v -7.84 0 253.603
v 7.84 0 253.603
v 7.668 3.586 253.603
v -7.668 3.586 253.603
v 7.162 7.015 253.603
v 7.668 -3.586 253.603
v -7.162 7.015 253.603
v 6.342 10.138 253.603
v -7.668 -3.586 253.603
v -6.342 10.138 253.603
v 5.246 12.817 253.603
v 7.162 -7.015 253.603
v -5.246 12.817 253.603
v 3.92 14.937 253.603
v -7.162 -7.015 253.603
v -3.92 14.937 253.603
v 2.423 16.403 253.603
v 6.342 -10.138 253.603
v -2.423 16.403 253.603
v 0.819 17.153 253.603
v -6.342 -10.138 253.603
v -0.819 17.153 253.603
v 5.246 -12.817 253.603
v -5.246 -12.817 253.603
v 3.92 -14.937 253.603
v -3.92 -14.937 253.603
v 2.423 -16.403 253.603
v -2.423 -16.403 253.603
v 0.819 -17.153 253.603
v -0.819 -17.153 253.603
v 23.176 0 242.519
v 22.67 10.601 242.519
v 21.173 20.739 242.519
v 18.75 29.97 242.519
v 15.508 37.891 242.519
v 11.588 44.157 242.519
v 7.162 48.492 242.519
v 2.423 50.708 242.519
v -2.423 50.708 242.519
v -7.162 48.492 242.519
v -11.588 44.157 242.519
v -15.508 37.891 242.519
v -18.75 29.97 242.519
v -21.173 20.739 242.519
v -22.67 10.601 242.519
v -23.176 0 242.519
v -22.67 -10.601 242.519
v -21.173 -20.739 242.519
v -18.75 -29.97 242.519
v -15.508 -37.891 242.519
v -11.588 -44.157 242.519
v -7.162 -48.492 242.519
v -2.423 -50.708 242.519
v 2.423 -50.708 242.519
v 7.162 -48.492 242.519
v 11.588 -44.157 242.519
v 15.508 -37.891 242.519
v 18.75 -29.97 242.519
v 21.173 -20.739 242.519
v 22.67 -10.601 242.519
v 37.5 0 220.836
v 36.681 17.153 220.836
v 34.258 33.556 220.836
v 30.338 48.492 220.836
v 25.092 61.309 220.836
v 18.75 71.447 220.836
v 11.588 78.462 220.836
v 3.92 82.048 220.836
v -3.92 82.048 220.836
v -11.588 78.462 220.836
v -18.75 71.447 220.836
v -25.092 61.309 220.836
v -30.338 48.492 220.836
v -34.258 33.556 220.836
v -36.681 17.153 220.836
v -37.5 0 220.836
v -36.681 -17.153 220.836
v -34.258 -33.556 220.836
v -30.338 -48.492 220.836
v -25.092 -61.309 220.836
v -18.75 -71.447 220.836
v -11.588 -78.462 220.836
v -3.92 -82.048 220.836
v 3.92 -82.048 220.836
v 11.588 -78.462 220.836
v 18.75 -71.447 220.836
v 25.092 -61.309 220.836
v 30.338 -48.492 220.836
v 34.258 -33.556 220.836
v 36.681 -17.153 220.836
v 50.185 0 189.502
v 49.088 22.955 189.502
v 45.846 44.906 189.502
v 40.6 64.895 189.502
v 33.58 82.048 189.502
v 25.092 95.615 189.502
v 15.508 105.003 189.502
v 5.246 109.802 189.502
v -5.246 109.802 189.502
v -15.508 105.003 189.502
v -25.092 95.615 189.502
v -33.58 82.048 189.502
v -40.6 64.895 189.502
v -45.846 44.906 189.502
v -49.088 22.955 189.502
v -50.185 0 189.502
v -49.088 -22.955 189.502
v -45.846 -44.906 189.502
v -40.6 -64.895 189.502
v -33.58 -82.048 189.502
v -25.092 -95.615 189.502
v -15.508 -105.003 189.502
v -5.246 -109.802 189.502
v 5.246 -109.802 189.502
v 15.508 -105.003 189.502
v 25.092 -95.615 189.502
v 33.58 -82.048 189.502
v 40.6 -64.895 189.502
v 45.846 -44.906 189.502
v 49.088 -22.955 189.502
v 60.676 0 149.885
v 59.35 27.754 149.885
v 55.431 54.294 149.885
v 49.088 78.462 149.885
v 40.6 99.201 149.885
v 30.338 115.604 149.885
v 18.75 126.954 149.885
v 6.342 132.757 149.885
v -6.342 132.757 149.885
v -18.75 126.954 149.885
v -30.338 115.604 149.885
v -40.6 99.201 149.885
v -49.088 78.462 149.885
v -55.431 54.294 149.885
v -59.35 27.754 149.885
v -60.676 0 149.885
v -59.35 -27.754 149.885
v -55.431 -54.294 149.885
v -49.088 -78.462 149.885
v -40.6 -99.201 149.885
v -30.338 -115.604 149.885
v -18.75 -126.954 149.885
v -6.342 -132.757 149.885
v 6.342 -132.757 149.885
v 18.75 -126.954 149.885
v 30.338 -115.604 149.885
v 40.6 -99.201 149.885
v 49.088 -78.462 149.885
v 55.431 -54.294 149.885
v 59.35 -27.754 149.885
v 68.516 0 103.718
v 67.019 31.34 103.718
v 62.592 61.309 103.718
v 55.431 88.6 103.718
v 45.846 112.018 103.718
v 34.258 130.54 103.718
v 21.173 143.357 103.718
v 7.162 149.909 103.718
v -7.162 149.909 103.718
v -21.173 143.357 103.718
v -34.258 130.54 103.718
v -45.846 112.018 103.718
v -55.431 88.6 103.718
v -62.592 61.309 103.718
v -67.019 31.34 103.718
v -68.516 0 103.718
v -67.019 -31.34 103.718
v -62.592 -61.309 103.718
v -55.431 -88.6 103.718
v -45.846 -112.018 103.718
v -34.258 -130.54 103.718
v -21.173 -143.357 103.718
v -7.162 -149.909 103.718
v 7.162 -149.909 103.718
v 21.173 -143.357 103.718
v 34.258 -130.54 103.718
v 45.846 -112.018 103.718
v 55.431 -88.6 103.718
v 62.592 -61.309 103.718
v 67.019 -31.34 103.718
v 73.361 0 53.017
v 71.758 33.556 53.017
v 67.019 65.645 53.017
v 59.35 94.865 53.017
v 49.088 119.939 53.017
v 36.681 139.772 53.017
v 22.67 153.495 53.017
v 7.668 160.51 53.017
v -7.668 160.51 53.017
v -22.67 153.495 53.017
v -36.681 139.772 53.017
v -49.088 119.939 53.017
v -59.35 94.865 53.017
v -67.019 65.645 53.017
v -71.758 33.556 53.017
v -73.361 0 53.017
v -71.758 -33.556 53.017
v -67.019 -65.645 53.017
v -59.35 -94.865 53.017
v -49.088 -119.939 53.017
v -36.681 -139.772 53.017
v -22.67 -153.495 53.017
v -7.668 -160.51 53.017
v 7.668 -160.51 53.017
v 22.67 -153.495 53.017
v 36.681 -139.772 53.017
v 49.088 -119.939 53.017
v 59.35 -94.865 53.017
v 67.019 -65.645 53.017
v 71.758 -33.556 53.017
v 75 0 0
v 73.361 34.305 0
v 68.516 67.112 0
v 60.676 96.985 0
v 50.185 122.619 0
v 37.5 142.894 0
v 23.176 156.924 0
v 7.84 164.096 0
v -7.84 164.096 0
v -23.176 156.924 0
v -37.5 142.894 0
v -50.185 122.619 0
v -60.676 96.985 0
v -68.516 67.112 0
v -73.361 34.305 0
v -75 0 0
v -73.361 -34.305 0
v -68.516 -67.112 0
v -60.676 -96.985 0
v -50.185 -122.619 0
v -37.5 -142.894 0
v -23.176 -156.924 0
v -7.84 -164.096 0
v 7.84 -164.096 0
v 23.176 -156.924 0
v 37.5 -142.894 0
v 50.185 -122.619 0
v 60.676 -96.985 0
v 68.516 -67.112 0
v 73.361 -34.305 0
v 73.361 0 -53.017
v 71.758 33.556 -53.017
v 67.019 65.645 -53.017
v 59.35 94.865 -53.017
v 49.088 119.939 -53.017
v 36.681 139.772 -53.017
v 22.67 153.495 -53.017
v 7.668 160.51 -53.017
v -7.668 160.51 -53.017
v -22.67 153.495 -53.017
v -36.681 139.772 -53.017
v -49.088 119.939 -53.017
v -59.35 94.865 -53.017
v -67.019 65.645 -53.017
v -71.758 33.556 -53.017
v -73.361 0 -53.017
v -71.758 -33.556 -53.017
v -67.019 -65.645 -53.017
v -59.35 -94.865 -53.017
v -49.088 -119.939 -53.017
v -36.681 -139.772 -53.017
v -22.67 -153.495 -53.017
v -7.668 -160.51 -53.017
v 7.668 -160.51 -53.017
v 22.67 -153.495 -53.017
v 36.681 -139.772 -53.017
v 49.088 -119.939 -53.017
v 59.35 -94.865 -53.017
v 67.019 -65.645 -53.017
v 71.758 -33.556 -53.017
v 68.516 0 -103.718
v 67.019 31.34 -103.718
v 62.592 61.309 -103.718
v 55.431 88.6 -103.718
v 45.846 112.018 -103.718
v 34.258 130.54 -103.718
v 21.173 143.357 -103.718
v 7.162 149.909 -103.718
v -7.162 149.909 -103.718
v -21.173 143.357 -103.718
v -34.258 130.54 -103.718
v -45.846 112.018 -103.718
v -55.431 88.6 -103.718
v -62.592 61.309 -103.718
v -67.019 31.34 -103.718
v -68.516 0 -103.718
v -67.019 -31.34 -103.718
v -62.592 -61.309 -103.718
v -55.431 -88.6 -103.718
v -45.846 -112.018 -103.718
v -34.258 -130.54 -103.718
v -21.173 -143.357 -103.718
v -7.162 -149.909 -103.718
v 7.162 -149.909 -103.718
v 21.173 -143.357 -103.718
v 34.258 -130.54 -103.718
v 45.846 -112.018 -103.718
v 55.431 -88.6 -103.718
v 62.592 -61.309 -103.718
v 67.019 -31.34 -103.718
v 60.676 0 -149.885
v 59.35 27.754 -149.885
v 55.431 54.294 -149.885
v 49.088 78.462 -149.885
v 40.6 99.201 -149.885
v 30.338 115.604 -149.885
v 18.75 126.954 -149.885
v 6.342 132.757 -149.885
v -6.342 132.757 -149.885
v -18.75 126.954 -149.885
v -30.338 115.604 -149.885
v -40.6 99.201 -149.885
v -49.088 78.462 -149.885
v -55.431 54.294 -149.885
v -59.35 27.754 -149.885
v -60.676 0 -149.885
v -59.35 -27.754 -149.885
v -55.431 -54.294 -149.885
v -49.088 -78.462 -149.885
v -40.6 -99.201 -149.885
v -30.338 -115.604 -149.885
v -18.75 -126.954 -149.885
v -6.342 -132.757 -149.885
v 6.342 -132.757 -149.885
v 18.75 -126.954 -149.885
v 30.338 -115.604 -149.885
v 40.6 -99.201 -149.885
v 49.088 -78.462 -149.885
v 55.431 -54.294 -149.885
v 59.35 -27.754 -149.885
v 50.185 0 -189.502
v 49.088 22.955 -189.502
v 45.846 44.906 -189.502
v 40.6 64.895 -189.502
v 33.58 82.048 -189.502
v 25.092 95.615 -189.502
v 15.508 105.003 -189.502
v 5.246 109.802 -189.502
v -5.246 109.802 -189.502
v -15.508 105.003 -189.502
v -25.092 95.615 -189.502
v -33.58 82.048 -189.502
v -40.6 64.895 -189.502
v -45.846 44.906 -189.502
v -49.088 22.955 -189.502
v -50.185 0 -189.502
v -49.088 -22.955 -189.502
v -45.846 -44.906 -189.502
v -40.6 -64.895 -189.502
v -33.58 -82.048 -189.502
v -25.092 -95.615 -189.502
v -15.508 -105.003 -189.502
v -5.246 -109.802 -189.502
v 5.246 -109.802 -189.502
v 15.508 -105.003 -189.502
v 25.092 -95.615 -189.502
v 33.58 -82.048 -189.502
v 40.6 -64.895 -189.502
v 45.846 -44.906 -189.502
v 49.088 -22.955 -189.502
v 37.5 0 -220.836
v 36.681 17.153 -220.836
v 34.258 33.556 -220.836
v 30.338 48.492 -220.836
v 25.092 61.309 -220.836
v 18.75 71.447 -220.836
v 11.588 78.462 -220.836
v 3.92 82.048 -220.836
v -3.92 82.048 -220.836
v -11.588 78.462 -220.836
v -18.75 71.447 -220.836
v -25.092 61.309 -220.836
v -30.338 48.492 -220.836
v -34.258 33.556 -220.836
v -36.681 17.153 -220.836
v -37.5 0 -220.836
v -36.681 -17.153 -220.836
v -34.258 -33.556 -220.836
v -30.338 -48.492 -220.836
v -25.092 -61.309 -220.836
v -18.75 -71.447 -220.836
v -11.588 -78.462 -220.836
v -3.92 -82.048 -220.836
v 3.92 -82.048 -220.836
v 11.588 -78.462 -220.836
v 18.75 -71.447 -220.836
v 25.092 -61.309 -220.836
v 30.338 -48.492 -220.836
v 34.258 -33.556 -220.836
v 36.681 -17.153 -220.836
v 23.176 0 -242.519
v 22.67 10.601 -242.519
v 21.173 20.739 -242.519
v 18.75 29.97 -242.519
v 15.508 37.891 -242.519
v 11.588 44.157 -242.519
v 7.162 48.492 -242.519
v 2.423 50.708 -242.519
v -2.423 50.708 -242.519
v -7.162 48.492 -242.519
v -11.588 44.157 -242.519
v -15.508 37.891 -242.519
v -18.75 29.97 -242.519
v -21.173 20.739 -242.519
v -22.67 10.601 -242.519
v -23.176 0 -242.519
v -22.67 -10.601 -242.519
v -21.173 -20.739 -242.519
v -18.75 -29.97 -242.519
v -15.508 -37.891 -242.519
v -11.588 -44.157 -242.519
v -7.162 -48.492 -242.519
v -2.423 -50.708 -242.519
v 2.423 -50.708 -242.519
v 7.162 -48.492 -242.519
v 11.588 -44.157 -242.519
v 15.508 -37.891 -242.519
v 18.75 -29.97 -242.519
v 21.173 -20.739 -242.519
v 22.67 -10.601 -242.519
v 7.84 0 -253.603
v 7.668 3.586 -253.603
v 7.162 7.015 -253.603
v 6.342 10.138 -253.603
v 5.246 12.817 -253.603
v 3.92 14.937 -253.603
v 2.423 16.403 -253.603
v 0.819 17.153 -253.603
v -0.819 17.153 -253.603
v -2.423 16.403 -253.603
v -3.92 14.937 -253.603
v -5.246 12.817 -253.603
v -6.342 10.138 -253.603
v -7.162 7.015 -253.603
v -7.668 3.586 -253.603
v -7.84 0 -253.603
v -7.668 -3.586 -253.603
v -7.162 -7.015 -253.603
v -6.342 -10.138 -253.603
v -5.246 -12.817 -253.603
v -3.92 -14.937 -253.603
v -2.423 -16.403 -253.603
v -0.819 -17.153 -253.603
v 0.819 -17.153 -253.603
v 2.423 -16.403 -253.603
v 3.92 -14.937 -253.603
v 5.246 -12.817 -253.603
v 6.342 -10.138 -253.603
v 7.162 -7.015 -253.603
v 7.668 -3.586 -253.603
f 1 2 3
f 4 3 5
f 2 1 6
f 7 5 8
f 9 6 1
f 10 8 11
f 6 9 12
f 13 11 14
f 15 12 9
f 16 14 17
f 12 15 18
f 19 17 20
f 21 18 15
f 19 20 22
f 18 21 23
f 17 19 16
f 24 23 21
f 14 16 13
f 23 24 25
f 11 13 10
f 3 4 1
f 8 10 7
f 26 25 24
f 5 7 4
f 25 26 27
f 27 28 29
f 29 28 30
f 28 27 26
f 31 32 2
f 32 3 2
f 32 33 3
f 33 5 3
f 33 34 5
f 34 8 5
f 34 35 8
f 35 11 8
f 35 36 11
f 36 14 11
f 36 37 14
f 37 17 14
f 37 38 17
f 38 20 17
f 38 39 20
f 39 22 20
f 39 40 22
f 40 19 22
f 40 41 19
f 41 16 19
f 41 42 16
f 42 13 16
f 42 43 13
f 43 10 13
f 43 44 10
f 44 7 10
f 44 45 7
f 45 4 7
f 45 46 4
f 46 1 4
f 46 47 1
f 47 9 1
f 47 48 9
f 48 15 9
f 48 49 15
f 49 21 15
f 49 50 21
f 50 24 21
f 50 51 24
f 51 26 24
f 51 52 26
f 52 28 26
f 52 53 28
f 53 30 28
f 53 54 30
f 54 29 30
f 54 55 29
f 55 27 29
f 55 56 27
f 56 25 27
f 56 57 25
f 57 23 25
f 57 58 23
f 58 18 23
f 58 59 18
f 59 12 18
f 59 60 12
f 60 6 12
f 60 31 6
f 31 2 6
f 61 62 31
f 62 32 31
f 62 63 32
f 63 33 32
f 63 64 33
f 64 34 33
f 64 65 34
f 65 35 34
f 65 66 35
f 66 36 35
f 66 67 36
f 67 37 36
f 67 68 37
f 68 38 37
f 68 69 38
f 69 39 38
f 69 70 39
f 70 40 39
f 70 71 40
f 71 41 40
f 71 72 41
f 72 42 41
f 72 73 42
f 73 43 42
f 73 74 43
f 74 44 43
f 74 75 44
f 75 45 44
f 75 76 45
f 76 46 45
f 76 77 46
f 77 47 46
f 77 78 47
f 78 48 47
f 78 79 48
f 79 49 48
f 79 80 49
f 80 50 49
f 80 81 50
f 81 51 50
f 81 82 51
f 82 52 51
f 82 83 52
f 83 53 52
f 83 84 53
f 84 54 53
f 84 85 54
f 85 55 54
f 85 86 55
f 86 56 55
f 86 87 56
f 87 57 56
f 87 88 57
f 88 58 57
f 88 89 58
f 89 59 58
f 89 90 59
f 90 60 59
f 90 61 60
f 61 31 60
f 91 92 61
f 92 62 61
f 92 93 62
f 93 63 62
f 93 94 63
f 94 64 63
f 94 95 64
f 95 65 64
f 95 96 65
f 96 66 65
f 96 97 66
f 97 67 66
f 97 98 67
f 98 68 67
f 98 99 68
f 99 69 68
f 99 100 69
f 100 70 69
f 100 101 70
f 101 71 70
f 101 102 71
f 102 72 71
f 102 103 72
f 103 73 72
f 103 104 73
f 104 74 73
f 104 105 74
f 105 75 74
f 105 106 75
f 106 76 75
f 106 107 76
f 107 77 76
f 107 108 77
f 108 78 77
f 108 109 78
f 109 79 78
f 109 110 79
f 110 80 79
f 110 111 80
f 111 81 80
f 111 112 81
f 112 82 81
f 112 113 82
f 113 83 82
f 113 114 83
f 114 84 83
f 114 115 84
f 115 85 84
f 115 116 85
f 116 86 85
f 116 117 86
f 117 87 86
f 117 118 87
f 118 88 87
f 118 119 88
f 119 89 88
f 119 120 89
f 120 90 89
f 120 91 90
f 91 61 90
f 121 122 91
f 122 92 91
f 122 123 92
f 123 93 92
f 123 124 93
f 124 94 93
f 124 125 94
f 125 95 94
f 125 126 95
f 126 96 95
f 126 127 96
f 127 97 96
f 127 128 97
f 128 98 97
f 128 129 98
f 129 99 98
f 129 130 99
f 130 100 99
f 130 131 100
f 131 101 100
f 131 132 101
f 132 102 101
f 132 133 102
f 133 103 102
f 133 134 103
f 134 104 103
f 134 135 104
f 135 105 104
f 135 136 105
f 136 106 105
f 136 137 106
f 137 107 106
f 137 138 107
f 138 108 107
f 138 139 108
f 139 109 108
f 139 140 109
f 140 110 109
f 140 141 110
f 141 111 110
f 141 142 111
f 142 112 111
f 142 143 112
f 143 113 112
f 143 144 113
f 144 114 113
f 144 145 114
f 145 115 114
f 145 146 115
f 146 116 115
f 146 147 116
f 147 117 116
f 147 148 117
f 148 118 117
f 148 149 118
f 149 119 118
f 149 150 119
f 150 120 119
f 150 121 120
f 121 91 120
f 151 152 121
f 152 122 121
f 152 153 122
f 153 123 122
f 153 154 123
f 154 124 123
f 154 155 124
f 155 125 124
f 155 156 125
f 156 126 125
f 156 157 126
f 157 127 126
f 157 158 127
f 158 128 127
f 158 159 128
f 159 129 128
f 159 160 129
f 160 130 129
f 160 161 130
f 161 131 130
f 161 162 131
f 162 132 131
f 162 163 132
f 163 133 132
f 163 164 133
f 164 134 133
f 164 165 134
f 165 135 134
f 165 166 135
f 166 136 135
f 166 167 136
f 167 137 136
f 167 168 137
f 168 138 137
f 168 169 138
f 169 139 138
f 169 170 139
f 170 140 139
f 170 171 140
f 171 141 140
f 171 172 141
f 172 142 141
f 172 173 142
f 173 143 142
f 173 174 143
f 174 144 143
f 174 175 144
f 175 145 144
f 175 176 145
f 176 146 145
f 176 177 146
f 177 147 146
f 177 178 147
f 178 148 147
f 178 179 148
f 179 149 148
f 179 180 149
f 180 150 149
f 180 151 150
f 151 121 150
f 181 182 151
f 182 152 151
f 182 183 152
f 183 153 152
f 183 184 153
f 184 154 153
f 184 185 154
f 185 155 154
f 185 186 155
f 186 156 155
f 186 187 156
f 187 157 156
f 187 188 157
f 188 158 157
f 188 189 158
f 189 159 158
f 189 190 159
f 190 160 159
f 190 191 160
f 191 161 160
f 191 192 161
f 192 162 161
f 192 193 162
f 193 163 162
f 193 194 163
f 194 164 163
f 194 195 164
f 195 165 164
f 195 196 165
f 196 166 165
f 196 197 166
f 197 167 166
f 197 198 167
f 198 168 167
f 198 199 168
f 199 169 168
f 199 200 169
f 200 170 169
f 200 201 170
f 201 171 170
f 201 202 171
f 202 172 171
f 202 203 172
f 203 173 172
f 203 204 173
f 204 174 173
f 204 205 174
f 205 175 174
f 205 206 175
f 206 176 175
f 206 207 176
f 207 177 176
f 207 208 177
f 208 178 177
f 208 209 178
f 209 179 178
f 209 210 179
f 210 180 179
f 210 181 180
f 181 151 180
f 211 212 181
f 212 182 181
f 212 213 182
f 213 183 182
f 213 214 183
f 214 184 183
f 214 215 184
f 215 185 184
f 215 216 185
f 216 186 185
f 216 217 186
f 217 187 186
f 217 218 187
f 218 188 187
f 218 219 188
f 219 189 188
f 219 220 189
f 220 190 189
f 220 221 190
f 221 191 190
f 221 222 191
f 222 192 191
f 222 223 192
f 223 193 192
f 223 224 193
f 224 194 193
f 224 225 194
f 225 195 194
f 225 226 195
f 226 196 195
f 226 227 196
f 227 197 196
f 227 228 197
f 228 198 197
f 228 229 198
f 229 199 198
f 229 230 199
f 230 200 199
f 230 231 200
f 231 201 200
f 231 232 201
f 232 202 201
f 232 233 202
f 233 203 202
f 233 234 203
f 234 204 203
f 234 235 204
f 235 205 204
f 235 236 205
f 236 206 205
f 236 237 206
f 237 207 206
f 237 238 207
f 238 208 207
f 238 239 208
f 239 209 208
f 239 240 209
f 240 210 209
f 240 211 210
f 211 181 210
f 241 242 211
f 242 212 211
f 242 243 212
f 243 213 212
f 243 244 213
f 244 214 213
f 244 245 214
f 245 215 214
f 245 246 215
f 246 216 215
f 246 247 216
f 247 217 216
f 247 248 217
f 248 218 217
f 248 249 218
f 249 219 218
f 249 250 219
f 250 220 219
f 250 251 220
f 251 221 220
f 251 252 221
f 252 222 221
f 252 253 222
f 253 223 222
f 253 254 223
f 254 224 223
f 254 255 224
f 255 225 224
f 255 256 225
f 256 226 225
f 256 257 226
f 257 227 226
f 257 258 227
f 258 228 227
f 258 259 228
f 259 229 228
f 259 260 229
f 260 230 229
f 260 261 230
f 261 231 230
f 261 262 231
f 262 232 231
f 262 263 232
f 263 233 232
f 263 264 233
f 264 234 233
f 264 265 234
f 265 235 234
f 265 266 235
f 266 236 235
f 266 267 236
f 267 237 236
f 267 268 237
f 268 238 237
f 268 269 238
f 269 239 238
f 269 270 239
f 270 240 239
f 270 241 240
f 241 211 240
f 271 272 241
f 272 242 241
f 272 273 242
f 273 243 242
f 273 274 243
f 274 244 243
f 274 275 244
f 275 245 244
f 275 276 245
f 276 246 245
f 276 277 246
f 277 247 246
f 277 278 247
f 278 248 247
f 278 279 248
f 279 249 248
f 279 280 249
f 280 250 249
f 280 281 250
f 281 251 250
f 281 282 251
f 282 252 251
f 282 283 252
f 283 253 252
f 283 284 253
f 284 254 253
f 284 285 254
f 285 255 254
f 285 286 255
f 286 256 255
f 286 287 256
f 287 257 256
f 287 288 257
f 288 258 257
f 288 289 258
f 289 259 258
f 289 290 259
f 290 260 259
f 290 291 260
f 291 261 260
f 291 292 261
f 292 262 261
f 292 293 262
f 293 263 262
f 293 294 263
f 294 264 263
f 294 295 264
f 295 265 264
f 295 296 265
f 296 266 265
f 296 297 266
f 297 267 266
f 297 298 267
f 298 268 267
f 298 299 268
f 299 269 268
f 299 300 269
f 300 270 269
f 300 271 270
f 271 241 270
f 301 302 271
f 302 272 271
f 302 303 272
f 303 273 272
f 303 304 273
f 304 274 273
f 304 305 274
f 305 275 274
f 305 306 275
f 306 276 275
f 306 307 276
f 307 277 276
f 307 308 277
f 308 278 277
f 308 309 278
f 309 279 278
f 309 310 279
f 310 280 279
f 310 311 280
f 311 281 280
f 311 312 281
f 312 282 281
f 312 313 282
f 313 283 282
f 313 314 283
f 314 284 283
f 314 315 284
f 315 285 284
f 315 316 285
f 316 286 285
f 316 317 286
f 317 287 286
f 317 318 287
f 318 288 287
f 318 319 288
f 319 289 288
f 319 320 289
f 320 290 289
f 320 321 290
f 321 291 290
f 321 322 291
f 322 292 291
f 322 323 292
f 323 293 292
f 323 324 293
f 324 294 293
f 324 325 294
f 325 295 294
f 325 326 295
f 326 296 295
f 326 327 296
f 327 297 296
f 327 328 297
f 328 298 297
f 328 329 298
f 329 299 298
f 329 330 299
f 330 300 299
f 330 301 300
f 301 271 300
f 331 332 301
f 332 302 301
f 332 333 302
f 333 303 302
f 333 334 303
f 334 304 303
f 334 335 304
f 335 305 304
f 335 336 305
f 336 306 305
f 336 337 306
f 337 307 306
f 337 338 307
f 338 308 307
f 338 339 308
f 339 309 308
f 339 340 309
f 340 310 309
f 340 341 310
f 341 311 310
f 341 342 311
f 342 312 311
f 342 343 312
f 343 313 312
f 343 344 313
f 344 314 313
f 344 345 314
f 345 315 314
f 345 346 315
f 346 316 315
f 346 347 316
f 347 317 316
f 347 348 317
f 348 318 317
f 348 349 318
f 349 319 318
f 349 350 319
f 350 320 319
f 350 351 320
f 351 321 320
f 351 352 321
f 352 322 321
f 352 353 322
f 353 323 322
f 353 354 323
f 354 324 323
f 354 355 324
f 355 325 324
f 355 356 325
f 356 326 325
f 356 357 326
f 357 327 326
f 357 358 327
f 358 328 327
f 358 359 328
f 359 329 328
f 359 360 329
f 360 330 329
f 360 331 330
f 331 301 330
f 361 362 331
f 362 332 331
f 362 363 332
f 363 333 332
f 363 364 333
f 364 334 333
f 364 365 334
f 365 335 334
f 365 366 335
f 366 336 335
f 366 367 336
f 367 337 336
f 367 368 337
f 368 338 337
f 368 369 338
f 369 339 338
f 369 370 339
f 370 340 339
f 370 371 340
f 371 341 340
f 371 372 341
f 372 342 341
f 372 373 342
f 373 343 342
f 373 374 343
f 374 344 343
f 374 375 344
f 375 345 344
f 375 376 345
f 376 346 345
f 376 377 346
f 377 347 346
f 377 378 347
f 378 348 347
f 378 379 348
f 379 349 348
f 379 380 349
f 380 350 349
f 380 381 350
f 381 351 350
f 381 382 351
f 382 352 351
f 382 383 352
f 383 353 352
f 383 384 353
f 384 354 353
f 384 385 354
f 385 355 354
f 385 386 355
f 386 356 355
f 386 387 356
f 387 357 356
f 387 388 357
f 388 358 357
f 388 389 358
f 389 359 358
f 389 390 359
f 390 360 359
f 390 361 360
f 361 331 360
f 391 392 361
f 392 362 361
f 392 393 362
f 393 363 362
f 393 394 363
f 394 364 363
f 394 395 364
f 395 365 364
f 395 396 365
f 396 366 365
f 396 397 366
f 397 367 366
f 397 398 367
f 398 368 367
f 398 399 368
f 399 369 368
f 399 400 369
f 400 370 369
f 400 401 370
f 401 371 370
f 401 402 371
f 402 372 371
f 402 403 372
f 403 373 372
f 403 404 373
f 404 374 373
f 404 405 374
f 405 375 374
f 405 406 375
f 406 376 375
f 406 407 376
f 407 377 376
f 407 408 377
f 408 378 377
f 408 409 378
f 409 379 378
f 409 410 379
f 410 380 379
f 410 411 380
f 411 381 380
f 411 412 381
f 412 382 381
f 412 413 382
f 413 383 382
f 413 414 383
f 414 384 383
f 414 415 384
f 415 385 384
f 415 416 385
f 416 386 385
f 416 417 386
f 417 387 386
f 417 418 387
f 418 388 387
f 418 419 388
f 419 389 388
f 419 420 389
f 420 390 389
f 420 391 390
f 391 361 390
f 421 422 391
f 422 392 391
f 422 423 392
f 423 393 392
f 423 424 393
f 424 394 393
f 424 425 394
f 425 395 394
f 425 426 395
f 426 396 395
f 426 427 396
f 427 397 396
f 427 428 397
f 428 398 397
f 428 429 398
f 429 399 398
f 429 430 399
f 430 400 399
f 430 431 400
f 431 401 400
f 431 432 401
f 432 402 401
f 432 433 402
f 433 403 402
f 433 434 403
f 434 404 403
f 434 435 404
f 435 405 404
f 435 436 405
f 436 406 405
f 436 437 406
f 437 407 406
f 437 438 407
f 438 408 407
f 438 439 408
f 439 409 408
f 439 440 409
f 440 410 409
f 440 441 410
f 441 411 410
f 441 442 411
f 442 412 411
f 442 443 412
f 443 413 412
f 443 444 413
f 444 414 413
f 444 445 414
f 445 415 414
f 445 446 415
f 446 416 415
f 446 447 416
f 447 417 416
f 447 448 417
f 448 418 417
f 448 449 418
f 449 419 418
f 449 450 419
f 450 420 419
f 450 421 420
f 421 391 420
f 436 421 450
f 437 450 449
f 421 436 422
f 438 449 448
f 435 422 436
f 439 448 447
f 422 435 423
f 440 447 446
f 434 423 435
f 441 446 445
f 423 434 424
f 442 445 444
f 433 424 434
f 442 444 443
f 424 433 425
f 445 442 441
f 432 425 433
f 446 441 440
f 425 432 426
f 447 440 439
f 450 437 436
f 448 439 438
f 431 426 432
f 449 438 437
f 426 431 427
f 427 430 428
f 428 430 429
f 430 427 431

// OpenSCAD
// Generated by SolidPython 1.0.1 on 2020-07-29 00:46:46


scale(v = [5, 11, 17]) {
	sphere(r = 15);
}
/***********************************************
*********      SolidPython code:      **********
************************************************
 
# import packages: SolidPython
from solid import *
from solid.utils import *
from itertools import chain, combinations, permutations


class Resize:

    def __init__(self, scad_file):
        self.scad_file = scad_file
        #self.scad_file = import_scad(scad_file)
        # cone/cylinder param:
        self.r1 = 0
        self.r2 = 0
        self.h = 0
        # rectangular prism param:
        self.w = 0
        self.l = 0
        # ellipse param:
        self.r = 0

    # import OpenScad code (file name corresponds to shape)


    # classify shape + parameters
    def assign(self, param1, param2, param3):
        if self.scad_file == 'cone.scad':
            self.r1 = param1
            self.r2 = param2
            self.h = param3
        elif self.scad_file == 'cylinder.scad':
            self.r1 = param1
            self.r2 = param2
            self.h = param3
        elif self.scad_file == 'rectangularPrism.scad':
            self.h = param1
            self.l = param2
            self.w = param3
        else:
            self.r = param1
            self.h = param2

    # resize parameters
    def iterate(self):
        x = range(3, 20, 2)
        i = 1
        if self.scad_file == 'cone.scad':
            tempList = list(permutations(x, 2))
            for temp in tempList:
                param1 = temp[0]
                param2 = temp[1]
                filepath = 'produced_scad_files/' + 'cone' + str(param1) + '_' + str(param2) + '_' + '.scad'
                scad_render_to_file(cylinder(h=param1, r1=param2, r2=0), filepath)

        elif self.scad_file == 'cylinder.scad':
            tempList = list(permutations(x, 3))
            for temp in tempList:
                param1 = temp[0]
                param2 = temp[1]
                filepath = 'produced_scad_files/' + 'cylinder' + str(param1) + '_' + str(param2) + '_' + '.scad'
                scad_render_to_file(cylinder(h=param1, r1=param2, r2=param2), filepath)

        elif self.scad_file == 'rectangularPrism.scad':
            tempList = list(permutations(x, 3))
            for temp in tempList:
                param1 = temp[0]
                param2 = temp[1]
                param3 = temp[2]
                filepath = 'produced_scad_files/' + 'rectangularPrism' + str(param1) + '_' + str(param2) + '_' + str(
                    param3) + '.scad'
                scad_render_to_file(cube(size=(param1, param2, param3)), filepath)

        elif self.scad_file == 'ellipse.scad':
            tempList = list(permutations(x, 4))
            for temp in tempList:
                param1 = temp[0]
                param2 = temp[1]
                param3 = temp[2]
                param4 = temp[3]
                filepath = 'produced_scad_files/' + 'ellipse' + str(param1) + '_' + str(param2) + '_' + str(param3) + '_' + str(param4) + '.scad'
                scad_render_to_file(scale([param1, param2, param3])(sphere(r=param4)), filepath)

    def render_to_scadfile(self):
        scad_render_to_file(scad, 'example.scad') 
 
************************************************/
